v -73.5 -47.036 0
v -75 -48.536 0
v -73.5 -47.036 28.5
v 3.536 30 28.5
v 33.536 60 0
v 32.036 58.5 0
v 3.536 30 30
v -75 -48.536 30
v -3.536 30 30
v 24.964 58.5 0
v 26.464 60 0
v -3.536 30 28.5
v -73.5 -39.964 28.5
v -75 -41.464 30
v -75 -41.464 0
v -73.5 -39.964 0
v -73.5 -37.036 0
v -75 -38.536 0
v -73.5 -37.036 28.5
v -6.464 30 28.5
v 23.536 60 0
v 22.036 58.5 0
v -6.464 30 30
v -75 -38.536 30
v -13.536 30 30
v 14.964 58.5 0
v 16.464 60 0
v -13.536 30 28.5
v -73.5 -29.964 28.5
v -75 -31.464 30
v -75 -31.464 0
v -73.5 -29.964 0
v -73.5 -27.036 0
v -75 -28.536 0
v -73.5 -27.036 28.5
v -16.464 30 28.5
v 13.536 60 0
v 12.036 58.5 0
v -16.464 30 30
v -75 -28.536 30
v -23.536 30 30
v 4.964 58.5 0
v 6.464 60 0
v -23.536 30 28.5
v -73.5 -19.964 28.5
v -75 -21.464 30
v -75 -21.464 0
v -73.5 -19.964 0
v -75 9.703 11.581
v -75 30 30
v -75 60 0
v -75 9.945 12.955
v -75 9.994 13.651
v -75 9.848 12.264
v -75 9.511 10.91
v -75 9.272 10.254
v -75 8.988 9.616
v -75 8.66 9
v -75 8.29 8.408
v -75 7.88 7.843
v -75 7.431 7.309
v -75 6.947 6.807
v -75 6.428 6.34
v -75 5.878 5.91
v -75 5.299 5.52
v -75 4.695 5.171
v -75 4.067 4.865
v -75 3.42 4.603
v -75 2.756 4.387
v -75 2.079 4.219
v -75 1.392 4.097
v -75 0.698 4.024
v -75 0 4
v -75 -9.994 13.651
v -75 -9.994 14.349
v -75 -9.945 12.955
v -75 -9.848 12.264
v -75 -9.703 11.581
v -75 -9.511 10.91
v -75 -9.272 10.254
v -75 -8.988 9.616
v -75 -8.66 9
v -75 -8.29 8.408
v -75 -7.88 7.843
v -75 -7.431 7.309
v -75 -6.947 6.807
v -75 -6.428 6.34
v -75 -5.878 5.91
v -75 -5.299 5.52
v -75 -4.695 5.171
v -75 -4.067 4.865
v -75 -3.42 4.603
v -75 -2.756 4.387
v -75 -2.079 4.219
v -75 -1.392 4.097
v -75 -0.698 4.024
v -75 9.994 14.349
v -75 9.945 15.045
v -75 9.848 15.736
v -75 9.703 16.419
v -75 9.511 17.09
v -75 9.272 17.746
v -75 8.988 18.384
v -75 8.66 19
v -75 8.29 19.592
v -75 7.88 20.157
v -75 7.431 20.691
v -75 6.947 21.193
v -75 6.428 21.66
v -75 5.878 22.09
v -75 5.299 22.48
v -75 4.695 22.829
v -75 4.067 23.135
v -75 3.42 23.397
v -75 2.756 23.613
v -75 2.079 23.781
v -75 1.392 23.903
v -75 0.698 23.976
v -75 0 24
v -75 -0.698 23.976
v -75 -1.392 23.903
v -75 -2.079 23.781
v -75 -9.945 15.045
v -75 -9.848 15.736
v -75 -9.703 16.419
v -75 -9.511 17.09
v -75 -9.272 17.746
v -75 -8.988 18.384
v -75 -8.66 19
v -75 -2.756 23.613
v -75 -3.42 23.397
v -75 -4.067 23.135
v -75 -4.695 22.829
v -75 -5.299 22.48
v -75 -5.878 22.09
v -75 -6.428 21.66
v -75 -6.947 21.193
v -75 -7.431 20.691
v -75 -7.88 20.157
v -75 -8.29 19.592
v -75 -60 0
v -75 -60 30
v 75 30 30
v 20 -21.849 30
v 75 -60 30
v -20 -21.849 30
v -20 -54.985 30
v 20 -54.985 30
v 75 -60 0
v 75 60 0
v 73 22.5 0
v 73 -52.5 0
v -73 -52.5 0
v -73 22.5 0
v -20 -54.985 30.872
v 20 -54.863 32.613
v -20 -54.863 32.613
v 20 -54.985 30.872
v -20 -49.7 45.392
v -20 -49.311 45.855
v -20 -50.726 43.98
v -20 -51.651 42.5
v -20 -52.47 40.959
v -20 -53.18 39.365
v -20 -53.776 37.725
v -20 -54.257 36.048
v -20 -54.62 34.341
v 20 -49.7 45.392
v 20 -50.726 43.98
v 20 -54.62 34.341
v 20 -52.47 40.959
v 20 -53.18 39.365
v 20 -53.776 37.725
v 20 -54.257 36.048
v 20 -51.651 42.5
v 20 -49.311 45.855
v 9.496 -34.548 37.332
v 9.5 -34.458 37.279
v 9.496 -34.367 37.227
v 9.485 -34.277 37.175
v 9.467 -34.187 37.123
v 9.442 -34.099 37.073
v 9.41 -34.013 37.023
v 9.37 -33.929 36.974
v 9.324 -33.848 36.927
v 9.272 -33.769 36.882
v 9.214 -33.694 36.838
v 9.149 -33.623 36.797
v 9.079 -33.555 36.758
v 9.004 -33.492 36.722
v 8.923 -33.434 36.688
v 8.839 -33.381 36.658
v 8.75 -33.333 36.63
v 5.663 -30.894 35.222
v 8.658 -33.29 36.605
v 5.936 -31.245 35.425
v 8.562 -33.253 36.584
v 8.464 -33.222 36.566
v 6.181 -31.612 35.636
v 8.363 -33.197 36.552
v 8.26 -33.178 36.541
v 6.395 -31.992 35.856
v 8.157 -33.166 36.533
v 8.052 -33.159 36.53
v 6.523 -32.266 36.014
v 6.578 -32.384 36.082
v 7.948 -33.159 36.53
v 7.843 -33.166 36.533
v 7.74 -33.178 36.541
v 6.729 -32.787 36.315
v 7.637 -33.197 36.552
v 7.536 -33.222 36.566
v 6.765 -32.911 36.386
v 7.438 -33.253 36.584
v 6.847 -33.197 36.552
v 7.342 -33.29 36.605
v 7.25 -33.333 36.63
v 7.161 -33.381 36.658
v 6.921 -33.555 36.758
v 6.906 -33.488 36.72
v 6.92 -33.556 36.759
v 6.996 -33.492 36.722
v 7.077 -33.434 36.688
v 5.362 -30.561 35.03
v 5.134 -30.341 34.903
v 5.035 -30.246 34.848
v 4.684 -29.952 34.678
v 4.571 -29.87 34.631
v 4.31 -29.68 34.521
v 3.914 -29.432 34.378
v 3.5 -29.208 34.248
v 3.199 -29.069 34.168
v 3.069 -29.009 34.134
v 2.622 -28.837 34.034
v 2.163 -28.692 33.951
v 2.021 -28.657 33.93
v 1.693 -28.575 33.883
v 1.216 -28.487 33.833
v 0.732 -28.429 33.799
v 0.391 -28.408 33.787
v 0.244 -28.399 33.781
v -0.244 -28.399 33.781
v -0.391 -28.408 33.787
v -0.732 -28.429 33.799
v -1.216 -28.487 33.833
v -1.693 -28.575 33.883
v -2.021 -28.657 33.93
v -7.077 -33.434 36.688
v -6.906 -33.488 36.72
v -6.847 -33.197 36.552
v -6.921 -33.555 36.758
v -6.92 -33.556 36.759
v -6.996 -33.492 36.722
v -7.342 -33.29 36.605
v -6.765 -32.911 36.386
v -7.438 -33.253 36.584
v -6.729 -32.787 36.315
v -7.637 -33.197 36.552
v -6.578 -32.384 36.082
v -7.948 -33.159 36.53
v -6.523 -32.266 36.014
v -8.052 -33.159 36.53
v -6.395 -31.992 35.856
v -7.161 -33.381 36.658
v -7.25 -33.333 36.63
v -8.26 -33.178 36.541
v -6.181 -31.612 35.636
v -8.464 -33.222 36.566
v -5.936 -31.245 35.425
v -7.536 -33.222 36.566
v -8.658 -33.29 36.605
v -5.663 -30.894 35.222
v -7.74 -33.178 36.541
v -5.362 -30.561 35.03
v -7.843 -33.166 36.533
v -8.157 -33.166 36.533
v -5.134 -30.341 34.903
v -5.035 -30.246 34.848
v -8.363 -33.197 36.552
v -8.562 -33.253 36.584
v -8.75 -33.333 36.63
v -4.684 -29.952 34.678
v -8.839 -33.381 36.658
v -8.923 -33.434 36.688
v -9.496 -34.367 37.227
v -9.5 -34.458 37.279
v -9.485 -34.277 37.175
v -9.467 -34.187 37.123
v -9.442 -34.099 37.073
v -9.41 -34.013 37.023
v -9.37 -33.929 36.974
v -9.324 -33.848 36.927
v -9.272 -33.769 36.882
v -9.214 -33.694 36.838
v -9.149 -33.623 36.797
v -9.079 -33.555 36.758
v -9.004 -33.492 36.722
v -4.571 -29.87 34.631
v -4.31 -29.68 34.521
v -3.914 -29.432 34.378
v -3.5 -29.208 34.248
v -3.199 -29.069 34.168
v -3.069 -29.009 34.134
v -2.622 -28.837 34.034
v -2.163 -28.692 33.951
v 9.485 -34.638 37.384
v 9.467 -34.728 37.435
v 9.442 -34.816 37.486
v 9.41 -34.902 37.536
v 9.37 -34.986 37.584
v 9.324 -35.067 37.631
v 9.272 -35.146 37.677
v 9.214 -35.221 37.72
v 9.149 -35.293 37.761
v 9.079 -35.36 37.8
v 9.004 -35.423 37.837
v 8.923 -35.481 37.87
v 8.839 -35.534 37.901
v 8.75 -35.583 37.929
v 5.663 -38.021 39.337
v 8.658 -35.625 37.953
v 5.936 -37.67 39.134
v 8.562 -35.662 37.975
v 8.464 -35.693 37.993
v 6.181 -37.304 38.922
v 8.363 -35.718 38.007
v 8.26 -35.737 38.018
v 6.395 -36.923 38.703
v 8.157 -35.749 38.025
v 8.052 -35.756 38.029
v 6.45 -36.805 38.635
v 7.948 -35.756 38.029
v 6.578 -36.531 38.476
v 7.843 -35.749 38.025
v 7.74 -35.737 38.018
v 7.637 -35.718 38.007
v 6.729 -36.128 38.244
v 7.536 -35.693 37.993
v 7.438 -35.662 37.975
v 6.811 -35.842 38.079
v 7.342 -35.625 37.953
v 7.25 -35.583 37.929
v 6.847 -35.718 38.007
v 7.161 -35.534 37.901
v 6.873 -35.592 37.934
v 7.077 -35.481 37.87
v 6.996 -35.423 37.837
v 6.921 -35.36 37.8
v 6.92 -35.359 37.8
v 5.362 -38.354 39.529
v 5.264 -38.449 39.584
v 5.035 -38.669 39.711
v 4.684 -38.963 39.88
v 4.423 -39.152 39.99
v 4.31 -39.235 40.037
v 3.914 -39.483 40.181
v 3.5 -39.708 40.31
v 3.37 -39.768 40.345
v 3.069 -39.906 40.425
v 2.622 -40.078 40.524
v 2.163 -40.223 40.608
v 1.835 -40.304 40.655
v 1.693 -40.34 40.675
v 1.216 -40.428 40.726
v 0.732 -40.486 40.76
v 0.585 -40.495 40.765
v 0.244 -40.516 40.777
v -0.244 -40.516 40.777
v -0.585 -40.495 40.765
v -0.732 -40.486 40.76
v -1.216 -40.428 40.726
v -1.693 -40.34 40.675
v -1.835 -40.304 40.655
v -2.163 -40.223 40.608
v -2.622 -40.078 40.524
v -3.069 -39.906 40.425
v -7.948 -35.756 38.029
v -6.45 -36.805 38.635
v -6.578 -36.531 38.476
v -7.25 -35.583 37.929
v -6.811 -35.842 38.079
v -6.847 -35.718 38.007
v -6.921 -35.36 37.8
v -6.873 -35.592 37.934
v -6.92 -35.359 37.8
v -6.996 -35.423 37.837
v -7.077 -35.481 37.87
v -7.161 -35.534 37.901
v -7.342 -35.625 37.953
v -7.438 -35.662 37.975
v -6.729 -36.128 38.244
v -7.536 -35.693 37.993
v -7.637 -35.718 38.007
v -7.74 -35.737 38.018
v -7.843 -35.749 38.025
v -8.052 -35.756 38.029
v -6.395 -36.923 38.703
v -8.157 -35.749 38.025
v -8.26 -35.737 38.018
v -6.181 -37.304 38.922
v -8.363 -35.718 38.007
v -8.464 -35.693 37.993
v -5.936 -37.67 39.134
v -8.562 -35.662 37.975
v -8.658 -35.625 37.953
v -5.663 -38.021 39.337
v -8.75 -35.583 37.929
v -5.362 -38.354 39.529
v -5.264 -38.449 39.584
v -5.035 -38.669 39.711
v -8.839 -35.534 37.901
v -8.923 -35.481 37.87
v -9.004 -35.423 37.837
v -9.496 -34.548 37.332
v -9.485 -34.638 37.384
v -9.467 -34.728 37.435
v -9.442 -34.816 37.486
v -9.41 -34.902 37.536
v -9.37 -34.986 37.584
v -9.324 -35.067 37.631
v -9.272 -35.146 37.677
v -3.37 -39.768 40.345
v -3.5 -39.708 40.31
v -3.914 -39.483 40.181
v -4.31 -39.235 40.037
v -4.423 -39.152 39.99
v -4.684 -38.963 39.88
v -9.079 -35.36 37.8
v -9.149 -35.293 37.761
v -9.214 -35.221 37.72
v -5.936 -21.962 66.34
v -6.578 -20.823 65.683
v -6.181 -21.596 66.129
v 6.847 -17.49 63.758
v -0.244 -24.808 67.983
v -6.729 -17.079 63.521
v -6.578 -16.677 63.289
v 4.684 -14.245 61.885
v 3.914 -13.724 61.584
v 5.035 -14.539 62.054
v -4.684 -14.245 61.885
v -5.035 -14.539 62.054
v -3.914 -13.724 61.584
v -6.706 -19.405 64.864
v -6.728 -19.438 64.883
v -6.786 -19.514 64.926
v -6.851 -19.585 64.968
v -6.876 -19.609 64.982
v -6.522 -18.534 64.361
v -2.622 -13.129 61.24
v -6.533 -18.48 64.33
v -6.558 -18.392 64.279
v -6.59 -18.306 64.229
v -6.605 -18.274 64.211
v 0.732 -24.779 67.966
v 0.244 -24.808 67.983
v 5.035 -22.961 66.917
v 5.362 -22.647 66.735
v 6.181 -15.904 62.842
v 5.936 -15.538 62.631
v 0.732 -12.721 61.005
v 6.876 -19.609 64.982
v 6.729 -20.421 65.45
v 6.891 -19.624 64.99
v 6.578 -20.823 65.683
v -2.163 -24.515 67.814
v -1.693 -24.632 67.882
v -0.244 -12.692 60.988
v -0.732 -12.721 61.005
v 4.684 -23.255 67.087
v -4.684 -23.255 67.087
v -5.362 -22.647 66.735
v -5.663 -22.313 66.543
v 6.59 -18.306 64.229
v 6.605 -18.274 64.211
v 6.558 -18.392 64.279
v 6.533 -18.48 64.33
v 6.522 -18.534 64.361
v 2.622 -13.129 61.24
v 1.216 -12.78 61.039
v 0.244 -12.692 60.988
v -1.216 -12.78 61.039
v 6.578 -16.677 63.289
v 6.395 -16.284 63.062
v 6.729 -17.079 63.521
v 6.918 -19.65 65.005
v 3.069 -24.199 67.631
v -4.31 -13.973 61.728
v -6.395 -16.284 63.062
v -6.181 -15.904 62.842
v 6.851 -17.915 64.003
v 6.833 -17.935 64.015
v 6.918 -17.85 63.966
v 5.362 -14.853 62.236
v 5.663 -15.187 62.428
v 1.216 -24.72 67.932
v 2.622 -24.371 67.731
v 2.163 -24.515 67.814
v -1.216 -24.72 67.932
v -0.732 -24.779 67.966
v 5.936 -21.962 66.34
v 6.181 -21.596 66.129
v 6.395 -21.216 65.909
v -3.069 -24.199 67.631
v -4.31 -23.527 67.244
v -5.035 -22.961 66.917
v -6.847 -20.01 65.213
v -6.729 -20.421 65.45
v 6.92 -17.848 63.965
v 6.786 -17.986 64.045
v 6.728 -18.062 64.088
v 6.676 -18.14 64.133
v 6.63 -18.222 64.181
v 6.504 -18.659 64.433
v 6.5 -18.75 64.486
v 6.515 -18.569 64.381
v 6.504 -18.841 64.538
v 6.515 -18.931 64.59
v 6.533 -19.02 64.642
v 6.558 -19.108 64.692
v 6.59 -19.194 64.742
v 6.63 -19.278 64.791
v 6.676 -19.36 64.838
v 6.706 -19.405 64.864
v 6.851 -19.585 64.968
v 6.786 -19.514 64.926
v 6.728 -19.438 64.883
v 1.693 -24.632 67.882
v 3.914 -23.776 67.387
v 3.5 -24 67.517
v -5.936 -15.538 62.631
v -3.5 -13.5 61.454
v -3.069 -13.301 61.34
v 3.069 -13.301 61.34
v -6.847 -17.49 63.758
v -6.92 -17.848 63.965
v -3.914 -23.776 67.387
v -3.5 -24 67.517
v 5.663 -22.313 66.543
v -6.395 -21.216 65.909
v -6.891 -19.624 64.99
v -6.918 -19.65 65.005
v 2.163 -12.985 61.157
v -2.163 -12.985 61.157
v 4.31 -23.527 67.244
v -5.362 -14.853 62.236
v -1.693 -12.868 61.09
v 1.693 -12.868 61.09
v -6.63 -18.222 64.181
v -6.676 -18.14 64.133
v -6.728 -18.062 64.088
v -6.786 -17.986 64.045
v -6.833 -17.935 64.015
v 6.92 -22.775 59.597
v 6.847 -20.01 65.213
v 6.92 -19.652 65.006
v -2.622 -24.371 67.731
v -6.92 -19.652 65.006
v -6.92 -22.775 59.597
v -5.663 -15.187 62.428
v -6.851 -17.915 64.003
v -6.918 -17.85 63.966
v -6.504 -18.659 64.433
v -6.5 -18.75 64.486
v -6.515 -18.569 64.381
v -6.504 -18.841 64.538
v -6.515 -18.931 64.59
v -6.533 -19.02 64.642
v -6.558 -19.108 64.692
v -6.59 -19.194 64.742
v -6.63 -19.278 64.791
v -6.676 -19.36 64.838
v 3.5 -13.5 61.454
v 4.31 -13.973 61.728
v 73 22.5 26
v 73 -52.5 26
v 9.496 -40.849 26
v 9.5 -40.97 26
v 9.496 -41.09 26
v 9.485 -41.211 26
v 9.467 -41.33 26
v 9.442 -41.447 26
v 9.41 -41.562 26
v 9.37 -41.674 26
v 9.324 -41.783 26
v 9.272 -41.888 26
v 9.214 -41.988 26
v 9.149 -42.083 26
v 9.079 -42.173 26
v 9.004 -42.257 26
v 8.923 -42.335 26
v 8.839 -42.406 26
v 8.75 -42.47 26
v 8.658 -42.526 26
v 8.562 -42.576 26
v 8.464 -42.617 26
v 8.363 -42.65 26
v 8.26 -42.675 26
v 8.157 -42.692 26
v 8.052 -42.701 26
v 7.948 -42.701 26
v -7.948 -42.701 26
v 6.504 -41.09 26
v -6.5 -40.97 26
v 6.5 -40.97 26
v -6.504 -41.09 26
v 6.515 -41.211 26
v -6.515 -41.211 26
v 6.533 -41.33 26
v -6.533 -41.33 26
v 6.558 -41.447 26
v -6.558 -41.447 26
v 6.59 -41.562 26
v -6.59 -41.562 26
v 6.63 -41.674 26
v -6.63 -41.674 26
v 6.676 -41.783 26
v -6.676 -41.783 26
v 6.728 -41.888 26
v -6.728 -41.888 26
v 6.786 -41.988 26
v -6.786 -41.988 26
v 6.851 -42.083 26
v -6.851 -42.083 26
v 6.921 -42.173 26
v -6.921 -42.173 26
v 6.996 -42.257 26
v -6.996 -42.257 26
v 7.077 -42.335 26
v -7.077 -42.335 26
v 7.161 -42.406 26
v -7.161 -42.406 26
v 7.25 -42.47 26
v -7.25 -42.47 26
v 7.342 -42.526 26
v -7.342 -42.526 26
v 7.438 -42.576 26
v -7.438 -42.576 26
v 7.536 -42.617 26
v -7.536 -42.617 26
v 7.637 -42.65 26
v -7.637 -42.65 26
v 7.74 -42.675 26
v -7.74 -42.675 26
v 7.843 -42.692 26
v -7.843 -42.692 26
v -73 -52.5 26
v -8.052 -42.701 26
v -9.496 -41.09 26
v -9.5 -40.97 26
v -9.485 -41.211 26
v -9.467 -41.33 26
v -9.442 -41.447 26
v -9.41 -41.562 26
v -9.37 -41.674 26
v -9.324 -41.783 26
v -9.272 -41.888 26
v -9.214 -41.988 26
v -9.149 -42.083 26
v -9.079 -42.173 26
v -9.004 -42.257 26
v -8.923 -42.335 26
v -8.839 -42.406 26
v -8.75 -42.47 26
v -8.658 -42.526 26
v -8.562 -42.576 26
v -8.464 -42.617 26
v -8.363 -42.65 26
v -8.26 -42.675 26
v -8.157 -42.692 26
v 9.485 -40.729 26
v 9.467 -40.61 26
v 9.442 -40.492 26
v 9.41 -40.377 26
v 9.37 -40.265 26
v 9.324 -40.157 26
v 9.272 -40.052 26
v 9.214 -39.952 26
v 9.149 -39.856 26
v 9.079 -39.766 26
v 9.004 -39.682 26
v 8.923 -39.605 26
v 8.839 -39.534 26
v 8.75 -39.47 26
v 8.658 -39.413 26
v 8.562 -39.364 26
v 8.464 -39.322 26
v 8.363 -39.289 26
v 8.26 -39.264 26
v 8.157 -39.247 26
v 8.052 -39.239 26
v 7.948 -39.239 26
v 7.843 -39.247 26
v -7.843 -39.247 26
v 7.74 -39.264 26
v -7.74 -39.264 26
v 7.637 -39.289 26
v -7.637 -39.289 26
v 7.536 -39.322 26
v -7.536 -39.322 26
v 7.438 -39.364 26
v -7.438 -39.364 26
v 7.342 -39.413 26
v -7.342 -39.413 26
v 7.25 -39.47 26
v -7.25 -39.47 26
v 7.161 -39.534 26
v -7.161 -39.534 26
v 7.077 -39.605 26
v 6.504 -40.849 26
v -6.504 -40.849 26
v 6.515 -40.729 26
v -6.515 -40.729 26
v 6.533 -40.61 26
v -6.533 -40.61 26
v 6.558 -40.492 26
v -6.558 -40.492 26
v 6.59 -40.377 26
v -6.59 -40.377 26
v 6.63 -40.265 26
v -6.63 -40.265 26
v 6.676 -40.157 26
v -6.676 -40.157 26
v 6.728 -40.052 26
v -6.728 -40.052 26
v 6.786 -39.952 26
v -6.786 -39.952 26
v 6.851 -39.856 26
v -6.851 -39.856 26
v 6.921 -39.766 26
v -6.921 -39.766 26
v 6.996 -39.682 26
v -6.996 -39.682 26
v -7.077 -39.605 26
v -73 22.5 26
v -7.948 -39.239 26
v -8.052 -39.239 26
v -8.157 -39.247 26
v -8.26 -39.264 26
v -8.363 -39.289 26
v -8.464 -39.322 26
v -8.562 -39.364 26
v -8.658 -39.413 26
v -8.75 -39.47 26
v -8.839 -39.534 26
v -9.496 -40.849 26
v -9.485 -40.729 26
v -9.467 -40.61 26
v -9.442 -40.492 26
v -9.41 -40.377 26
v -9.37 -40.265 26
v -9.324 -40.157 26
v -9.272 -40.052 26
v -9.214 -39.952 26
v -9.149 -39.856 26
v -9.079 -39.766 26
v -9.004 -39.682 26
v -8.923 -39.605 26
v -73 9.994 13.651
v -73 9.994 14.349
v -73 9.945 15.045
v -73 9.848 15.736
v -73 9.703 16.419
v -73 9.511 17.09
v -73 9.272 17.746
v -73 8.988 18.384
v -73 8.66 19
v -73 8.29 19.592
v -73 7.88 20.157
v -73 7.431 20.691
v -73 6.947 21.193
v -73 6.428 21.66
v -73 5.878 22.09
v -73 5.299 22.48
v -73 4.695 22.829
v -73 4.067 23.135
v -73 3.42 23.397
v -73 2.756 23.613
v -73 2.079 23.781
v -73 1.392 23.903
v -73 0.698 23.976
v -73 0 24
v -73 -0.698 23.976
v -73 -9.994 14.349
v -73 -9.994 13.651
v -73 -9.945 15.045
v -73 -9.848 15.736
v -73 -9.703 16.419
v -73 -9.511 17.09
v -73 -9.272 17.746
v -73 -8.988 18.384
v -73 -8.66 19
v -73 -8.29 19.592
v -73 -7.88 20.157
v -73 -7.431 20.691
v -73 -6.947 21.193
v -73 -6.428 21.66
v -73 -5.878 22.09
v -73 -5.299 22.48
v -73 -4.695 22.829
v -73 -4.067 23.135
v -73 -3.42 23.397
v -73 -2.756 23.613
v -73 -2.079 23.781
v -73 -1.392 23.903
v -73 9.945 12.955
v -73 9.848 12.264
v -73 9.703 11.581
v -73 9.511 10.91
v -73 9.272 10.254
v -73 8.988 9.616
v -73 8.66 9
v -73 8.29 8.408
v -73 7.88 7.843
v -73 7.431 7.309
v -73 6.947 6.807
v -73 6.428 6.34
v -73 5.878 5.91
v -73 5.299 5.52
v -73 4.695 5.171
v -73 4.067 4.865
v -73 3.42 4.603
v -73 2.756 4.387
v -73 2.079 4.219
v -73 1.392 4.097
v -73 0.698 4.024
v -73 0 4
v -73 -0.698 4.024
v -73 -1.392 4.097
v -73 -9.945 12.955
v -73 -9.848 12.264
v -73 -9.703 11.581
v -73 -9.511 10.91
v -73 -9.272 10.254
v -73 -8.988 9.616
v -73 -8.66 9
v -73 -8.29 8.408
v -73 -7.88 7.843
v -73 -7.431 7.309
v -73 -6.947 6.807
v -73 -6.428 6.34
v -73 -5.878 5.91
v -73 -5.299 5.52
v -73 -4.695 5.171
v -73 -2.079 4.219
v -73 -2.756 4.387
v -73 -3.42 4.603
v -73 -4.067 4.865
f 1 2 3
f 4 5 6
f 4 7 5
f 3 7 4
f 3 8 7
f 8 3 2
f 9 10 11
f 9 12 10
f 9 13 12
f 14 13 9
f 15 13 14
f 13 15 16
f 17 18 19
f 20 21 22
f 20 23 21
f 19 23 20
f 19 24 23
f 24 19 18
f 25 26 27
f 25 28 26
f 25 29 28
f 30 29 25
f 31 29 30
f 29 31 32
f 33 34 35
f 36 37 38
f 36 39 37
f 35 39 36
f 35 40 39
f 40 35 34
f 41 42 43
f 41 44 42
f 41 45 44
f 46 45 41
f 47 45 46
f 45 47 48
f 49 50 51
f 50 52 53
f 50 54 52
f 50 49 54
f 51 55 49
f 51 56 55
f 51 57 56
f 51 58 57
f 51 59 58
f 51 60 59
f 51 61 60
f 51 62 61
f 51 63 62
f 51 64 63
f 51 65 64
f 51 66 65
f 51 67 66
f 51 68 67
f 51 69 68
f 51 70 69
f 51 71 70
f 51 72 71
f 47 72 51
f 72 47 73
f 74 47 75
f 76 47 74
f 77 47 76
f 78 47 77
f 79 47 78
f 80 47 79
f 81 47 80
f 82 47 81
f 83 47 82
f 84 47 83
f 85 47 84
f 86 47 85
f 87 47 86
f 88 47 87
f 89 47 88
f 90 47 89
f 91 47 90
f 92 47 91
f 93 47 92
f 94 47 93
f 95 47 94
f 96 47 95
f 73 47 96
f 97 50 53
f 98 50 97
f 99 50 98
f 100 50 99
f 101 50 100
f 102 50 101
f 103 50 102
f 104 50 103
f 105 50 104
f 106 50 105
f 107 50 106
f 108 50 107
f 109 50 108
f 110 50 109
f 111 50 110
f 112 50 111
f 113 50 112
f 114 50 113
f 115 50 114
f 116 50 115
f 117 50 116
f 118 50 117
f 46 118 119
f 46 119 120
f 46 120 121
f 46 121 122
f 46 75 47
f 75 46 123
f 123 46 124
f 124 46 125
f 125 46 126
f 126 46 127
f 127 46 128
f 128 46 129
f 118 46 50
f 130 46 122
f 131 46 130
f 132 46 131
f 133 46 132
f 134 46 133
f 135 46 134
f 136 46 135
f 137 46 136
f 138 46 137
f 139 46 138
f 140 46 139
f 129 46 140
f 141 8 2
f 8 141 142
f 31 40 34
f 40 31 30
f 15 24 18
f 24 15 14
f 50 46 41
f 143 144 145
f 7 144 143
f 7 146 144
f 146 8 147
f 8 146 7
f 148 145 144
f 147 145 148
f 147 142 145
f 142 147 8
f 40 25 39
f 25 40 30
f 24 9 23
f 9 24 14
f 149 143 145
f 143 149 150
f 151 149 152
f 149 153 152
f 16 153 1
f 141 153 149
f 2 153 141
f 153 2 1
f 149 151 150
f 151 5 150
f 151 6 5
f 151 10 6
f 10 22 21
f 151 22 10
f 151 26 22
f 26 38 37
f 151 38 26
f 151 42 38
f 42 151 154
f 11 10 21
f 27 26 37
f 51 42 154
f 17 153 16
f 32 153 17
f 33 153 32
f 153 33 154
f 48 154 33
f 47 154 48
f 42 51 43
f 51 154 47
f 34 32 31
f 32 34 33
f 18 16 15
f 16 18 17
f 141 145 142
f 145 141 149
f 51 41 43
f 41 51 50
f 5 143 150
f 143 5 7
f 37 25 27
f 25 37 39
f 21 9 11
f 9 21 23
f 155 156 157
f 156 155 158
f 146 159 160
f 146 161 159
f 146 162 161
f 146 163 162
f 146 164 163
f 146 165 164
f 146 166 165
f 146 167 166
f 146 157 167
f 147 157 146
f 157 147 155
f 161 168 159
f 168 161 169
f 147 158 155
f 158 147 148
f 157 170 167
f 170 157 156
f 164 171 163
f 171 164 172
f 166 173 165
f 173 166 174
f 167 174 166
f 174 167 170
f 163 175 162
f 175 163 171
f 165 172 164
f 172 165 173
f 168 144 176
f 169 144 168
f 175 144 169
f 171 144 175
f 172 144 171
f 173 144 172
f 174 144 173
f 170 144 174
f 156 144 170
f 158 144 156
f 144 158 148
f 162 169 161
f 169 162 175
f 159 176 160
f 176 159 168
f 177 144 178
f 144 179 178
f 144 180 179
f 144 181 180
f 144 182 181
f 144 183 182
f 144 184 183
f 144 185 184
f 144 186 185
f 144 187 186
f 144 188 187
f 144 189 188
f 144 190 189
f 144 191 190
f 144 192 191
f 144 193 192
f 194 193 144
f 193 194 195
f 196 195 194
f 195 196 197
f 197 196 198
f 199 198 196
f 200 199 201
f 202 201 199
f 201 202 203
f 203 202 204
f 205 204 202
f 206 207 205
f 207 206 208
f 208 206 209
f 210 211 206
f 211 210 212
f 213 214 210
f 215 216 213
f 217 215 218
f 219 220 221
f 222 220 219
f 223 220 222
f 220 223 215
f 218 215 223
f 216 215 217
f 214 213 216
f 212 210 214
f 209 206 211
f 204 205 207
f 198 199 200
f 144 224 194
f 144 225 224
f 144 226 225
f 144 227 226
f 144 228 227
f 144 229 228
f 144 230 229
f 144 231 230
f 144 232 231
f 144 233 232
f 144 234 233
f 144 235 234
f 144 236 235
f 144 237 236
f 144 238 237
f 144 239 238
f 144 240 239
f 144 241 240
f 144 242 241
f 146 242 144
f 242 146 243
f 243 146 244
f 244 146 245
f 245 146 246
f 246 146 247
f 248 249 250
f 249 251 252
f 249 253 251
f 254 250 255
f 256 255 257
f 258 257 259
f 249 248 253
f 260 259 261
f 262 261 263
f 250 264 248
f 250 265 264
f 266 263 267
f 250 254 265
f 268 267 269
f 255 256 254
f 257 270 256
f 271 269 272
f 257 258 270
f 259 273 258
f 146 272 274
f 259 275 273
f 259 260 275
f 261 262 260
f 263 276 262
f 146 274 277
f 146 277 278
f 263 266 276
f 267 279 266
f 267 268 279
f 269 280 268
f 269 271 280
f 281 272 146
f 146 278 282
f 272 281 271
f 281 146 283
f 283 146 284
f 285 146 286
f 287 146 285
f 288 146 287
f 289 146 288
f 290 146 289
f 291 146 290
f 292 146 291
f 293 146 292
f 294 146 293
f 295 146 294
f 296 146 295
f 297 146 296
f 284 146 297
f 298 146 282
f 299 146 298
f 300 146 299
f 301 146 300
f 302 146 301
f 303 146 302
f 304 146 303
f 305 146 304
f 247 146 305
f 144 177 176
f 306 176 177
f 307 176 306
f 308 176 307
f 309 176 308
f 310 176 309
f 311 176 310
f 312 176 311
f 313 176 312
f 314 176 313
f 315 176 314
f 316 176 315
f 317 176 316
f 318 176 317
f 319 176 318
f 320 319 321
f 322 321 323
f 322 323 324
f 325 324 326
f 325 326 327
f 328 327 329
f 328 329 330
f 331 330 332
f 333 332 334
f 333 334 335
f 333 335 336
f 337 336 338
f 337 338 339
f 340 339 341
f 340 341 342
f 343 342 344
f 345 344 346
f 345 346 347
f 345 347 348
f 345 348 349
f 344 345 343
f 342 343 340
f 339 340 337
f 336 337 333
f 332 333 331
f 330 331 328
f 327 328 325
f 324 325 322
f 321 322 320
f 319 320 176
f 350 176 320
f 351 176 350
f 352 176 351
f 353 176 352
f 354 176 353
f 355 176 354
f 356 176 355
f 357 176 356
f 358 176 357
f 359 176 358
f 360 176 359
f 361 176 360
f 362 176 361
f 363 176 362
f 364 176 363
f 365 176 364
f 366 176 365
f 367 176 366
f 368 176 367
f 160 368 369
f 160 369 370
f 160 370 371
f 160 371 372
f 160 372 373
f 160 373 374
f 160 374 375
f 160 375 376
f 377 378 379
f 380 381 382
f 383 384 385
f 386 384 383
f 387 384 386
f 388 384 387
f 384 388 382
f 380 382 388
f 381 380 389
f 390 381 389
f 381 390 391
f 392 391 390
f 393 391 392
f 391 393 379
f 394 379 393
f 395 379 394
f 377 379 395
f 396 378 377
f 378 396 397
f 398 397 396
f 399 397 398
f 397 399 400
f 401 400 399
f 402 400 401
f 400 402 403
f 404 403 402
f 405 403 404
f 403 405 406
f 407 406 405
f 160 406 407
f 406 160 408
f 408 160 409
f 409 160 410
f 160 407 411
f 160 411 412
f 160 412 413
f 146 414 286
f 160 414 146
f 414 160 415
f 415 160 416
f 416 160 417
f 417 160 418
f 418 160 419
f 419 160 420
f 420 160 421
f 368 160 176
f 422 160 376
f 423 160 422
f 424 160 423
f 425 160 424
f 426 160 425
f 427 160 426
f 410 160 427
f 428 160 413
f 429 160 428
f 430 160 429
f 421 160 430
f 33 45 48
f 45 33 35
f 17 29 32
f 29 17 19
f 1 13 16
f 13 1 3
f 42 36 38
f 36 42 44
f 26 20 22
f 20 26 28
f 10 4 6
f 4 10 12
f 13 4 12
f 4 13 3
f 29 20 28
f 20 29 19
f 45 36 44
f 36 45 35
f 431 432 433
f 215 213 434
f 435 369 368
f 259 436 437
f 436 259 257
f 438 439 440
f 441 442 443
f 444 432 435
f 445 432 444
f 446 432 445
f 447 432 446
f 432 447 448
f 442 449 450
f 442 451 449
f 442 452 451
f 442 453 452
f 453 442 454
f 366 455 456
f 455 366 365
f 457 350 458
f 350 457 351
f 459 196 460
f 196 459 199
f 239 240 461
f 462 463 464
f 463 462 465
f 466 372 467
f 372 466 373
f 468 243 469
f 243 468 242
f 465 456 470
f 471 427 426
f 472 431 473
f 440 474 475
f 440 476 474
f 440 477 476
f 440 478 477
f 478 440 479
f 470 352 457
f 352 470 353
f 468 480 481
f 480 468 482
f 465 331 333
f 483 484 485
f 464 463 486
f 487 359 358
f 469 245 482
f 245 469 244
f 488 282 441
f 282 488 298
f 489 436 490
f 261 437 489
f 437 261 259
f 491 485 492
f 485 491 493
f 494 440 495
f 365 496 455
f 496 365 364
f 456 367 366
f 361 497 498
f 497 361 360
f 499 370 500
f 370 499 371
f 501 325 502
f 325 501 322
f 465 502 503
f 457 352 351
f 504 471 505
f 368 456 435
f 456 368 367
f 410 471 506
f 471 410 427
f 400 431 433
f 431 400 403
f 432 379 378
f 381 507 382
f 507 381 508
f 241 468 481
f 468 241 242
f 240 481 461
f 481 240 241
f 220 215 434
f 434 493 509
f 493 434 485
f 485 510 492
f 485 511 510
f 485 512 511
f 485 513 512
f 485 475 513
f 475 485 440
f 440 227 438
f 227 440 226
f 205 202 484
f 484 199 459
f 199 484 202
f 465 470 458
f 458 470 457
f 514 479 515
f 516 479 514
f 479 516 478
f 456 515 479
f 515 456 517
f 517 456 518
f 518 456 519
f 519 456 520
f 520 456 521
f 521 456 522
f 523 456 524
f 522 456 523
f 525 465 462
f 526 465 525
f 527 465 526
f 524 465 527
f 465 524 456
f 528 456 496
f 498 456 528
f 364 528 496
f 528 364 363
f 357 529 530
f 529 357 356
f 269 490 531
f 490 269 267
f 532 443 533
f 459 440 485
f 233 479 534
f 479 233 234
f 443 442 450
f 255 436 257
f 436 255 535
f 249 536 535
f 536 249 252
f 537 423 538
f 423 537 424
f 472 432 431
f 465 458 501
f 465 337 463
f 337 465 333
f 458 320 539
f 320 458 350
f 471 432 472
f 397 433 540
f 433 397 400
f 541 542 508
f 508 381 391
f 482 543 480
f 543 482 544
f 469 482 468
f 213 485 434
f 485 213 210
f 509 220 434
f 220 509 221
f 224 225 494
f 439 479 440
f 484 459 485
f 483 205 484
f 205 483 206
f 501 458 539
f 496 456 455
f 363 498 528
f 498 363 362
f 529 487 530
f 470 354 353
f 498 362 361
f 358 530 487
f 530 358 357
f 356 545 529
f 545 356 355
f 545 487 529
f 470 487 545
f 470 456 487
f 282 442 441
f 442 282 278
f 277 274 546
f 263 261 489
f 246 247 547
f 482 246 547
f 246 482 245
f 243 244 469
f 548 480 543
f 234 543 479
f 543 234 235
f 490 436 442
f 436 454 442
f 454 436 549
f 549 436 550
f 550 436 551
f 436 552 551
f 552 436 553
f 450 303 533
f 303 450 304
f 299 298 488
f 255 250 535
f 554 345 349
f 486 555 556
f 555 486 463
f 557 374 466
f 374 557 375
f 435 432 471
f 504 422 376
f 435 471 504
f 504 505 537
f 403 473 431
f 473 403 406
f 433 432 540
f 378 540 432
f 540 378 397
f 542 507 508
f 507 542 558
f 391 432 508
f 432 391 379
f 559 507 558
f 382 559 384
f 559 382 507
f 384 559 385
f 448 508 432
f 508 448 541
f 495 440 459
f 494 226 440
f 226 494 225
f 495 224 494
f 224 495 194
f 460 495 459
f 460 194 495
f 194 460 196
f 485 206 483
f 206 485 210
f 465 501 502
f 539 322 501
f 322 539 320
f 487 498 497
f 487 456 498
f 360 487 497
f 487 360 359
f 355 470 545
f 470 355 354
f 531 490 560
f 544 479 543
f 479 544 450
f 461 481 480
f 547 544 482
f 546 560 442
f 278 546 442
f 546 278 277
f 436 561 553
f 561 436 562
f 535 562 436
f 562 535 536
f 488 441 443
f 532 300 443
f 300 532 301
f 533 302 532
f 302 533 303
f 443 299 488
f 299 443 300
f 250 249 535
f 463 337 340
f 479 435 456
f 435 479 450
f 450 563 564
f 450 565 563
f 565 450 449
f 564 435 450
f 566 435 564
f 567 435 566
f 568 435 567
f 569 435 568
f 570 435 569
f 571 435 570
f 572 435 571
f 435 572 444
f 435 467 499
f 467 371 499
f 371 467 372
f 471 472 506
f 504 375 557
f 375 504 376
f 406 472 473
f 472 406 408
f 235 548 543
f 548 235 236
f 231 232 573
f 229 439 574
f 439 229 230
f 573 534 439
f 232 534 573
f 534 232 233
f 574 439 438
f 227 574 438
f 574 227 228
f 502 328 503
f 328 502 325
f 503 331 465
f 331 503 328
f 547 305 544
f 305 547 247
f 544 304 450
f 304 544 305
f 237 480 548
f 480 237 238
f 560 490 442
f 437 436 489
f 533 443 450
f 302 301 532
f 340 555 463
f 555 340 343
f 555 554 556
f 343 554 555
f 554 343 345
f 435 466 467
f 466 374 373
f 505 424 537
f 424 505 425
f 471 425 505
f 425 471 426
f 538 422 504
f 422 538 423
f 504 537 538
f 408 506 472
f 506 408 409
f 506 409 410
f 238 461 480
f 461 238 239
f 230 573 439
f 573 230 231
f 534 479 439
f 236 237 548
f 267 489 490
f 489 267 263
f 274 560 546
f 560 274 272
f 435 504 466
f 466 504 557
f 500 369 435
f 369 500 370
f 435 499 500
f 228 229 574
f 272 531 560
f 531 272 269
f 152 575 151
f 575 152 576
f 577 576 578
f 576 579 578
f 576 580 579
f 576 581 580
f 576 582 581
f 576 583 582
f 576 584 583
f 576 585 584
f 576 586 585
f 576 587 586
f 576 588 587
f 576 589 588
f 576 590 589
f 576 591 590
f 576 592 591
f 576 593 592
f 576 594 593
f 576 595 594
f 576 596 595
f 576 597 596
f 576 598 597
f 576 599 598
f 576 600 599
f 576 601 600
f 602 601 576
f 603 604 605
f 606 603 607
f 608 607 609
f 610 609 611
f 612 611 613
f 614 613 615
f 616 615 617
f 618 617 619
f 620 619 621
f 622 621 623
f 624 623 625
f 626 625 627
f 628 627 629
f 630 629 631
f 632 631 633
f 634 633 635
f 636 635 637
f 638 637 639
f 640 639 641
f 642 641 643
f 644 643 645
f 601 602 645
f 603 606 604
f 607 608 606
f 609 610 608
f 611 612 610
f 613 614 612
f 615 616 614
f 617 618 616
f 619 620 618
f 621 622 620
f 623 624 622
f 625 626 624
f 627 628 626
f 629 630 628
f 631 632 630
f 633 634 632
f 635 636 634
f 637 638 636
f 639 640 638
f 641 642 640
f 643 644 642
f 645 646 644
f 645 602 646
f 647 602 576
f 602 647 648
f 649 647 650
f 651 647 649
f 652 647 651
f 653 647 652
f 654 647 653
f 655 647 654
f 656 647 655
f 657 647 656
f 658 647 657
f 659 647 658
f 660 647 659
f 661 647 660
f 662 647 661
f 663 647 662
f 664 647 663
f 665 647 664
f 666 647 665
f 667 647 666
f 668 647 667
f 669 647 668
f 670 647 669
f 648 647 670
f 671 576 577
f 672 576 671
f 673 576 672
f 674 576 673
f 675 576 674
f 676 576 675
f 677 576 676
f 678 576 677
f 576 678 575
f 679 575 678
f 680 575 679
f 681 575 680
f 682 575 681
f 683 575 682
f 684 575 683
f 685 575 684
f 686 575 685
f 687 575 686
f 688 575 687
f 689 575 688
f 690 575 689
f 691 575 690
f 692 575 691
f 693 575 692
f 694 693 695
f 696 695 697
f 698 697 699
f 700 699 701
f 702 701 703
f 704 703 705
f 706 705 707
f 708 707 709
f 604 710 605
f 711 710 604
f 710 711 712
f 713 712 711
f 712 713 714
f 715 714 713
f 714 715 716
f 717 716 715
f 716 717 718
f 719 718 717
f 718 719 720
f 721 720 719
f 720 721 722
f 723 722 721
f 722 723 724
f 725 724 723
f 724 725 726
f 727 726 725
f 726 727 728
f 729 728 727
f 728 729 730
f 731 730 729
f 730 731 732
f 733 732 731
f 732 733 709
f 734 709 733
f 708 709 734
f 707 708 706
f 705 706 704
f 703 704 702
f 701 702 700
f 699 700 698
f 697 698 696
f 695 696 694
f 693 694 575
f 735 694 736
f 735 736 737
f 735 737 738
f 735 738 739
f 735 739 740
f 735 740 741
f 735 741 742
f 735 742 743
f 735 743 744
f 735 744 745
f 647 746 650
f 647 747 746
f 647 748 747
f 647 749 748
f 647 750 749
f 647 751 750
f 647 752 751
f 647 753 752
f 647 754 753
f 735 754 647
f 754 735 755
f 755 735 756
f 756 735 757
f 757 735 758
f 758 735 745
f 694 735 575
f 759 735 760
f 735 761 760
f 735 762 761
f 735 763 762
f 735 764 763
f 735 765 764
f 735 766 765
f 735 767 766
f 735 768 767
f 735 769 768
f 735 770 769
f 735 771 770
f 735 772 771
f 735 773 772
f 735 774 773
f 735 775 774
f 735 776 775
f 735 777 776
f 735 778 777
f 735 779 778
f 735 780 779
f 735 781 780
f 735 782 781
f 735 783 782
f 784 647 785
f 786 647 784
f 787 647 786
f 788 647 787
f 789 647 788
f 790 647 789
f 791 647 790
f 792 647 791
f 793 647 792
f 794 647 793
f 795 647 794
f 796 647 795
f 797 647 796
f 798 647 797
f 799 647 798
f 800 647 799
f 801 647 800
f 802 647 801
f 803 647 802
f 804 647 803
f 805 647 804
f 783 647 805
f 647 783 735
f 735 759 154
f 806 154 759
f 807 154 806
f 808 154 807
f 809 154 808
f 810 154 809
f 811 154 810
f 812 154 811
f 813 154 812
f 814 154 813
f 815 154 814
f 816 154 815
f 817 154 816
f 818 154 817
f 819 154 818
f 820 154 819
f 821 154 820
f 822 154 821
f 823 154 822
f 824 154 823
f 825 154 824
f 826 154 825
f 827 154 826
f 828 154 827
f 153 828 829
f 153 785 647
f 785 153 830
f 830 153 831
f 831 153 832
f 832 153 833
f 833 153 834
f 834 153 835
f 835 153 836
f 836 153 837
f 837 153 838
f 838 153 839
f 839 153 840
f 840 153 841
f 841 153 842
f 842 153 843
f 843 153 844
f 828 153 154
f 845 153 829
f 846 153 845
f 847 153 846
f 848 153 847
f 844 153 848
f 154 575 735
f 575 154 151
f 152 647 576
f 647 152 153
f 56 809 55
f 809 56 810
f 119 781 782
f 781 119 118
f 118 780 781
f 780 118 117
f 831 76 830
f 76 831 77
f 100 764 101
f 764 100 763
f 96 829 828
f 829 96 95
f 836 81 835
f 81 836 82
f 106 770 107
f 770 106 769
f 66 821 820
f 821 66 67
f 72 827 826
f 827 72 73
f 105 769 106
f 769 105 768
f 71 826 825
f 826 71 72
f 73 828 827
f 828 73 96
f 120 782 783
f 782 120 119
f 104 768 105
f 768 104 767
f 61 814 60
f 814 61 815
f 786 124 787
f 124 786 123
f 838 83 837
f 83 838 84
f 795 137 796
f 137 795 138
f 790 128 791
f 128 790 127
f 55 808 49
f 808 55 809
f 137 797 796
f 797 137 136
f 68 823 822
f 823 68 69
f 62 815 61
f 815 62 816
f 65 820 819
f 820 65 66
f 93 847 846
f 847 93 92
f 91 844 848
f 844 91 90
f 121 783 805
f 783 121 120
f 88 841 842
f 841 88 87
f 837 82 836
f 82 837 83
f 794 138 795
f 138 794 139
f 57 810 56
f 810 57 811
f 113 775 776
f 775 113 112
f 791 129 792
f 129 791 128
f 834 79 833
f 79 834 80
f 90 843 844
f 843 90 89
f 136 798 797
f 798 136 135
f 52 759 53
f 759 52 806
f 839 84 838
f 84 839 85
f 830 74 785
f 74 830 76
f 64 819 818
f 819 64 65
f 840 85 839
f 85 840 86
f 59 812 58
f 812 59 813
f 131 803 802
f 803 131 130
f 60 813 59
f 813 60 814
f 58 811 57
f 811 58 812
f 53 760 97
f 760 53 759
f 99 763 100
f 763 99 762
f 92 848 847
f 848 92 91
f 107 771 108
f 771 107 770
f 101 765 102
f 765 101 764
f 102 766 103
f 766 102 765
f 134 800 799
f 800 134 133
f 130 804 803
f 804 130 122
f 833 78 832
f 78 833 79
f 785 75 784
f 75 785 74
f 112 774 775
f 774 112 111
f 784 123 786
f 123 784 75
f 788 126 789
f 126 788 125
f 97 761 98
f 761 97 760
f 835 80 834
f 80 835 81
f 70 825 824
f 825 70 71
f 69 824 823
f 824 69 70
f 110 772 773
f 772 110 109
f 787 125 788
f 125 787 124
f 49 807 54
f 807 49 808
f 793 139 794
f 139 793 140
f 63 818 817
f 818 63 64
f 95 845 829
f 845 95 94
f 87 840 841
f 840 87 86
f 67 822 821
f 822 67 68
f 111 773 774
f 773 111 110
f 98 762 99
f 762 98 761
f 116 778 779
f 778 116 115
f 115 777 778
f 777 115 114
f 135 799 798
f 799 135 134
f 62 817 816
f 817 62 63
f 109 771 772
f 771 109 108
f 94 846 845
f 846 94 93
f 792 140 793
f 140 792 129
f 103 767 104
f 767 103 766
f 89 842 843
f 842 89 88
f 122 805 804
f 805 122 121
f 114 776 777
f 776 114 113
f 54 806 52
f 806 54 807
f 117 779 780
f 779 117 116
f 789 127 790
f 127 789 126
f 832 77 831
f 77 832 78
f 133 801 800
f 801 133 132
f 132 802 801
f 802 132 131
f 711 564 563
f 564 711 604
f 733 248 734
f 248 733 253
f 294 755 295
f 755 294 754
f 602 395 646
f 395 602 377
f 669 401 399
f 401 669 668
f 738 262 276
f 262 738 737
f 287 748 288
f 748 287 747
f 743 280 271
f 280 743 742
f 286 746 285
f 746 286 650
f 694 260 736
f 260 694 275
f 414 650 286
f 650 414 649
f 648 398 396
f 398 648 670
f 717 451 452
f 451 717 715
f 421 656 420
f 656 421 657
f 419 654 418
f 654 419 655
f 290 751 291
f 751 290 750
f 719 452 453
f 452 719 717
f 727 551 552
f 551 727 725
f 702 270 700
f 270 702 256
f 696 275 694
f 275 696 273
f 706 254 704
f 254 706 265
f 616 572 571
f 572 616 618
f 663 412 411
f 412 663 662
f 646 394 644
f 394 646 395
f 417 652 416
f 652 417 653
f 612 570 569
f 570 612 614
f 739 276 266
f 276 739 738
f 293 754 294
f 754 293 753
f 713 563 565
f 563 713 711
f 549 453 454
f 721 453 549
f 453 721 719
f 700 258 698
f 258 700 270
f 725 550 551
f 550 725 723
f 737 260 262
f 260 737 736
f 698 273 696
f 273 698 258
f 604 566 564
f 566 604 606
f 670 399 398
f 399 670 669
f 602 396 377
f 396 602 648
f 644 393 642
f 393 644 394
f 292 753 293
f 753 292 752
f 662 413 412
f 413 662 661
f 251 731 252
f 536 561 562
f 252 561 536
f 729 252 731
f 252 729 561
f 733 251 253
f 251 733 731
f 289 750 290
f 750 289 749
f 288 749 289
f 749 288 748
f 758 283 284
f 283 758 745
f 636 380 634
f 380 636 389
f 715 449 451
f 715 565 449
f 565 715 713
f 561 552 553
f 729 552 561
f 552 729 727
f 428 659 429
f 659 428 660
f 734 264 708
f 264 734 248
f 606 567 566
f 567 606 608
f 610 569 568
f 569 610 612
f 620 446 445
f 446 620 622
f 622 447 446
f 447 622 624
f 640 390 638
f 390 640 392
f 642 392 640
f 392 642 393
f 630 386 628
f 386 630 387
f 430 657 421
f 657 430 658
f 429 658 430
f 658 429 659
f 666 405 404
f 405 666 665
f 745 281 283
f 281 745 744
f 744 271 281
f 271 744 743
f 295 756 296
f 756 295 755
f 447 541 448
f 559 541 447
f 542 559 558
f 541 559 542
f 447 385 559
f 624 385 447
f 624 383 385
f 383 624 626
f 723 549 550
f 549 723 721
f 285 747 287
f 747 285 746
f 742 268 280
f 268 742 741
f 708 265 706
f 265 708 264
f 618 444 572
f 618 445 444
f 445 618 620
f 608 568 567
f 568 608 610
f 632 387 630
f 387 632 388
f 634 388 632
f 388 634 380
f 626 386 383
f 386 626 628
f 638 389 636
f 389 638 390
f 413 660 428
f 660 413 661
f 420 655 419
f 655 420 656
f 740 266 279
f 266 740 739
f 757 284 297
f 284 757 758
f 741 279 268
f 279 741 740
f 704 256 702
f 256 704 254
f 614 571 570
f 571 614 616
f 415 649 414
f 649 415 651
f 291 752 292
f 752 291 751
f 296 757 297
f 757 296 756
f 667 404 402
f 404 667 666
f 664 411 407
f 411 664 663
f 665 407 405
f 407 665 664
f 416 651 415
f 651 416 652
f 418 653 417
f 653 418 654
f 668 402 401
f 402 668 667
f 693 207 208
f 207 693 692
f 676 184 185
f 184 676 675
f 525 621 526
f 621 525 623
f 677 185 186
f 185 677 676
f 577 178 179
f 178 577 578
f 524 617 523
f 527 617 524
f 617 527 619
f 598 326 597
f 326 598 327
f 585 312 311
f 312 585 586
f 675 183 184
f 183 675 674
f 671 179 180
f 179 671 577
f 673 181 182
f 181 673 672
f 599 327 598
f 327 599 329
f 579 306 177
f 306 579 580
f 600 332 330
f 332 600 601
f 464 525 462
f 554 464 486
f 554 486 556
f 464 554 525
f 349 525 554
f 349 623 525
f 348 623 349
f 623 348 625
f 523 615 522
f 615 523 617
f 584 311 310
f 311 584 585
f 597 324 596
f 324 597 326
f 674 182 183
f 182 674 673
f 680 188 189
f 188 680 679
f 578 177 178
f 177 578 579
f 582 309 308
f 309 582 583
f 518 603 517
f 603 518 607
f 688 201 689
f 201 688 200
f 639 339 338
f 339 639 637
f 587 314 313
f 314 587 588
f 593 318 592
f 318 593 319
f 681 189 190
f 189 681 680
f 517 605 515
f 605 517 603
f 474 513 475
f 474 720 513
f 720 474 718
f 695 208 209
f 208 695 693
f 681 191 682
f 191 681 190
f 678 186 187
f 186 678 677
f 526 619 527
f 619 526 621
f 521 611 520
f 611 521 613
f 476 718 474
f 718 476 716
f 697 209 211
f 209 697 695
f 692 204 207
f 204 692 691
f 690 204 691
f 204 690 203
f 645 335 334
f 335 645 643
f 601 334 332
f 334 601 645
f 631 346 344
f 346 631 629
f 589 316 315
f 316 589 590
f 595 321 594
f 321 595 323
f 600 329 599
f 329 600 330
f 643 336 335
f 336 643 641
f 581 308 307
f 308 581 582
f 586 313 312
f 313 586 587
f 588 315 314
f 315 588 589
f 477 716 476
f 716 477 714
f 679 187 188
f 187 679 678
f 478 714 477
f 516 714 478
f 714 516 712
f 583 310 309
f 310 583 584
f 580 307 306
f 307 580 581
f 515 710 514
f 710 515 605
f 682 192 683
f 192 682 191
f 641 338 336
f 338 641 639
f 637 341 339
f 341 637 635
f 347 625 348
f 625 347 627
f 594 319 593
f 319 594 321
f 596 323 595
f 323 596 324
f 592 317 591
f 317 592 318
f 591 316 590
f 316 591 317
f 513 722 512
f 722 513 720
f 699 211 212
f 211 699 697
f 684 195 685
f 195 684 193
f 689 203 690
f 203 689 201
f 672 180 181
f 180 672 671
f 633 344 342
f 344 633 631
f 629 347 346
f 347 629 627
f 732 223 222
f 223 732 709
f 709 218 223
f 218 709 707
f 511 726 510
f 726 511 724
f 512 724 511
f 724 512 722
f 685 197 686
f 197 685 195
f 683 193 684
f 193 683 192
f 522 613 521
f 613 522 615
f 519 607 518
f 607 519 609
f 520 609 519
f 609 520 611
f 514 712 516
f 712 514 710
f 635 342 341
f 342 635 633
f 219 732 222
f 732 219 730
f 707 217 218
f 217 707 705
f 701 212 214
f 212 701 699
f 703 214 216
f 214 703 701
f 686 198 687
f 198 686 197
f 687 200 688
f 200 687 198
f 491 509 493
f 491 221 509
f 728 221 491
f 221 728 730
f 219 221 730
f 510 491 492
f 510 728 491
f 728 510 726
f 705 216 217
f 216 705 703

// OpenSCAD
$fa=4; // default minimum facet angle is now 4
$fs=0.05; // default minimum facet size is now 0.05 mm

l = 150;
w = 120;
h = 30;
wallThickness = 2;
switchRad = 10;
batteryWidth = 28.5;
batteryHeight = 19.5;
batteryDepth = 50;

difference() {
  union() {
    difference() {
      baseShape(l, w, h, 0);
      translate([0, 0, -.05]) baseShape(l, w, h, -wallThickness);
      translate([-15, 15, 0]) union() {
        rotate([0, 0, -45]) cube([5, 200, h * 2 + 2], center = true);
        translate([-5, 5, 0]) rotate([0, 0, -45]) cube([5, 200, h * 2 + 2], center = true);
        translate([-10, 10, 0]) rotate([0, 0, -45]) cube([5, 200, h * 2 + 2], center = true);
      }
    }
    baseShape(l, w, h, -wallThickness * .75);
    translate([0, -30, h]) difference() {
      rotate([0, 90, 0]) cylinder(r = 25, h = 40, center=true);
      translate([0, 12.5, 12.5]) rotate([-30, 0, 0]) cube([42, 60, 26], center=true);
    }
    translate([0, -30, h + 15]) rotate([-30, 0, 0]) cylinder(r = 7, h = 45, center = true);
  }
  translate([0, -h / 2, (h / 2) - (wallThickness * 2)]) cube([l - wallThickness * 2, w - h - 15, h], center=true);
  translate([-l / 2, 0, h / 2 - wallThickness / 2]) rotate([0, 90, 0]) cylinder(r = switchRad, h = 25, center=true);
  translate([-8, -30, h + 15]) rotate([-30, 0, 0]) cylinder(r = 1.5, h = 75, center=true);
  translate([8, -30, h + 15]) rotate([-30, 0, 0]) cylinder(r = 1.5, h = 75, center=true);
}

// translate([55, (w - h - 15)/2 - (h/2) - batteryWidth / 2, h - batteryHeight / 2 - wallThickness * 2]) rotate([0, 0, 90]) difference() {
//   cube([batteryWidth + wallThickness, batteryDepth - 15, batteryHeight + wallThickness], center=true);
//   translate([wallThickness, 0, wallThickness]) cube([batteryWidth, batteryDepth + 2, batteryHeight], center=true);
// }



module baseShape(len, width, height, offset = 0) {
  x = (len / 2) + offset;
  y = (width / 2) + offset;
  z = height + offset;

  points = [
    [-x, y, 0],
    [x, y, 0],
    [x, -y, 0],
    [-x, -y, 0],
    [-x, -y, z],
    [-x, y - z, z],
    [x, y - z, z],
    [x, -y, z]
  ];
  faces = [
    [4, 5, 6, 7],
    [4, 3, 0, 5],
    [1, 2, 7, 6],
    [2, 3, 4, 7],
    [1, 6, 5, 0],
    [3, 2, 1, 0]
  ];
  polyhedron(points, faces, convexity = 10);
}
